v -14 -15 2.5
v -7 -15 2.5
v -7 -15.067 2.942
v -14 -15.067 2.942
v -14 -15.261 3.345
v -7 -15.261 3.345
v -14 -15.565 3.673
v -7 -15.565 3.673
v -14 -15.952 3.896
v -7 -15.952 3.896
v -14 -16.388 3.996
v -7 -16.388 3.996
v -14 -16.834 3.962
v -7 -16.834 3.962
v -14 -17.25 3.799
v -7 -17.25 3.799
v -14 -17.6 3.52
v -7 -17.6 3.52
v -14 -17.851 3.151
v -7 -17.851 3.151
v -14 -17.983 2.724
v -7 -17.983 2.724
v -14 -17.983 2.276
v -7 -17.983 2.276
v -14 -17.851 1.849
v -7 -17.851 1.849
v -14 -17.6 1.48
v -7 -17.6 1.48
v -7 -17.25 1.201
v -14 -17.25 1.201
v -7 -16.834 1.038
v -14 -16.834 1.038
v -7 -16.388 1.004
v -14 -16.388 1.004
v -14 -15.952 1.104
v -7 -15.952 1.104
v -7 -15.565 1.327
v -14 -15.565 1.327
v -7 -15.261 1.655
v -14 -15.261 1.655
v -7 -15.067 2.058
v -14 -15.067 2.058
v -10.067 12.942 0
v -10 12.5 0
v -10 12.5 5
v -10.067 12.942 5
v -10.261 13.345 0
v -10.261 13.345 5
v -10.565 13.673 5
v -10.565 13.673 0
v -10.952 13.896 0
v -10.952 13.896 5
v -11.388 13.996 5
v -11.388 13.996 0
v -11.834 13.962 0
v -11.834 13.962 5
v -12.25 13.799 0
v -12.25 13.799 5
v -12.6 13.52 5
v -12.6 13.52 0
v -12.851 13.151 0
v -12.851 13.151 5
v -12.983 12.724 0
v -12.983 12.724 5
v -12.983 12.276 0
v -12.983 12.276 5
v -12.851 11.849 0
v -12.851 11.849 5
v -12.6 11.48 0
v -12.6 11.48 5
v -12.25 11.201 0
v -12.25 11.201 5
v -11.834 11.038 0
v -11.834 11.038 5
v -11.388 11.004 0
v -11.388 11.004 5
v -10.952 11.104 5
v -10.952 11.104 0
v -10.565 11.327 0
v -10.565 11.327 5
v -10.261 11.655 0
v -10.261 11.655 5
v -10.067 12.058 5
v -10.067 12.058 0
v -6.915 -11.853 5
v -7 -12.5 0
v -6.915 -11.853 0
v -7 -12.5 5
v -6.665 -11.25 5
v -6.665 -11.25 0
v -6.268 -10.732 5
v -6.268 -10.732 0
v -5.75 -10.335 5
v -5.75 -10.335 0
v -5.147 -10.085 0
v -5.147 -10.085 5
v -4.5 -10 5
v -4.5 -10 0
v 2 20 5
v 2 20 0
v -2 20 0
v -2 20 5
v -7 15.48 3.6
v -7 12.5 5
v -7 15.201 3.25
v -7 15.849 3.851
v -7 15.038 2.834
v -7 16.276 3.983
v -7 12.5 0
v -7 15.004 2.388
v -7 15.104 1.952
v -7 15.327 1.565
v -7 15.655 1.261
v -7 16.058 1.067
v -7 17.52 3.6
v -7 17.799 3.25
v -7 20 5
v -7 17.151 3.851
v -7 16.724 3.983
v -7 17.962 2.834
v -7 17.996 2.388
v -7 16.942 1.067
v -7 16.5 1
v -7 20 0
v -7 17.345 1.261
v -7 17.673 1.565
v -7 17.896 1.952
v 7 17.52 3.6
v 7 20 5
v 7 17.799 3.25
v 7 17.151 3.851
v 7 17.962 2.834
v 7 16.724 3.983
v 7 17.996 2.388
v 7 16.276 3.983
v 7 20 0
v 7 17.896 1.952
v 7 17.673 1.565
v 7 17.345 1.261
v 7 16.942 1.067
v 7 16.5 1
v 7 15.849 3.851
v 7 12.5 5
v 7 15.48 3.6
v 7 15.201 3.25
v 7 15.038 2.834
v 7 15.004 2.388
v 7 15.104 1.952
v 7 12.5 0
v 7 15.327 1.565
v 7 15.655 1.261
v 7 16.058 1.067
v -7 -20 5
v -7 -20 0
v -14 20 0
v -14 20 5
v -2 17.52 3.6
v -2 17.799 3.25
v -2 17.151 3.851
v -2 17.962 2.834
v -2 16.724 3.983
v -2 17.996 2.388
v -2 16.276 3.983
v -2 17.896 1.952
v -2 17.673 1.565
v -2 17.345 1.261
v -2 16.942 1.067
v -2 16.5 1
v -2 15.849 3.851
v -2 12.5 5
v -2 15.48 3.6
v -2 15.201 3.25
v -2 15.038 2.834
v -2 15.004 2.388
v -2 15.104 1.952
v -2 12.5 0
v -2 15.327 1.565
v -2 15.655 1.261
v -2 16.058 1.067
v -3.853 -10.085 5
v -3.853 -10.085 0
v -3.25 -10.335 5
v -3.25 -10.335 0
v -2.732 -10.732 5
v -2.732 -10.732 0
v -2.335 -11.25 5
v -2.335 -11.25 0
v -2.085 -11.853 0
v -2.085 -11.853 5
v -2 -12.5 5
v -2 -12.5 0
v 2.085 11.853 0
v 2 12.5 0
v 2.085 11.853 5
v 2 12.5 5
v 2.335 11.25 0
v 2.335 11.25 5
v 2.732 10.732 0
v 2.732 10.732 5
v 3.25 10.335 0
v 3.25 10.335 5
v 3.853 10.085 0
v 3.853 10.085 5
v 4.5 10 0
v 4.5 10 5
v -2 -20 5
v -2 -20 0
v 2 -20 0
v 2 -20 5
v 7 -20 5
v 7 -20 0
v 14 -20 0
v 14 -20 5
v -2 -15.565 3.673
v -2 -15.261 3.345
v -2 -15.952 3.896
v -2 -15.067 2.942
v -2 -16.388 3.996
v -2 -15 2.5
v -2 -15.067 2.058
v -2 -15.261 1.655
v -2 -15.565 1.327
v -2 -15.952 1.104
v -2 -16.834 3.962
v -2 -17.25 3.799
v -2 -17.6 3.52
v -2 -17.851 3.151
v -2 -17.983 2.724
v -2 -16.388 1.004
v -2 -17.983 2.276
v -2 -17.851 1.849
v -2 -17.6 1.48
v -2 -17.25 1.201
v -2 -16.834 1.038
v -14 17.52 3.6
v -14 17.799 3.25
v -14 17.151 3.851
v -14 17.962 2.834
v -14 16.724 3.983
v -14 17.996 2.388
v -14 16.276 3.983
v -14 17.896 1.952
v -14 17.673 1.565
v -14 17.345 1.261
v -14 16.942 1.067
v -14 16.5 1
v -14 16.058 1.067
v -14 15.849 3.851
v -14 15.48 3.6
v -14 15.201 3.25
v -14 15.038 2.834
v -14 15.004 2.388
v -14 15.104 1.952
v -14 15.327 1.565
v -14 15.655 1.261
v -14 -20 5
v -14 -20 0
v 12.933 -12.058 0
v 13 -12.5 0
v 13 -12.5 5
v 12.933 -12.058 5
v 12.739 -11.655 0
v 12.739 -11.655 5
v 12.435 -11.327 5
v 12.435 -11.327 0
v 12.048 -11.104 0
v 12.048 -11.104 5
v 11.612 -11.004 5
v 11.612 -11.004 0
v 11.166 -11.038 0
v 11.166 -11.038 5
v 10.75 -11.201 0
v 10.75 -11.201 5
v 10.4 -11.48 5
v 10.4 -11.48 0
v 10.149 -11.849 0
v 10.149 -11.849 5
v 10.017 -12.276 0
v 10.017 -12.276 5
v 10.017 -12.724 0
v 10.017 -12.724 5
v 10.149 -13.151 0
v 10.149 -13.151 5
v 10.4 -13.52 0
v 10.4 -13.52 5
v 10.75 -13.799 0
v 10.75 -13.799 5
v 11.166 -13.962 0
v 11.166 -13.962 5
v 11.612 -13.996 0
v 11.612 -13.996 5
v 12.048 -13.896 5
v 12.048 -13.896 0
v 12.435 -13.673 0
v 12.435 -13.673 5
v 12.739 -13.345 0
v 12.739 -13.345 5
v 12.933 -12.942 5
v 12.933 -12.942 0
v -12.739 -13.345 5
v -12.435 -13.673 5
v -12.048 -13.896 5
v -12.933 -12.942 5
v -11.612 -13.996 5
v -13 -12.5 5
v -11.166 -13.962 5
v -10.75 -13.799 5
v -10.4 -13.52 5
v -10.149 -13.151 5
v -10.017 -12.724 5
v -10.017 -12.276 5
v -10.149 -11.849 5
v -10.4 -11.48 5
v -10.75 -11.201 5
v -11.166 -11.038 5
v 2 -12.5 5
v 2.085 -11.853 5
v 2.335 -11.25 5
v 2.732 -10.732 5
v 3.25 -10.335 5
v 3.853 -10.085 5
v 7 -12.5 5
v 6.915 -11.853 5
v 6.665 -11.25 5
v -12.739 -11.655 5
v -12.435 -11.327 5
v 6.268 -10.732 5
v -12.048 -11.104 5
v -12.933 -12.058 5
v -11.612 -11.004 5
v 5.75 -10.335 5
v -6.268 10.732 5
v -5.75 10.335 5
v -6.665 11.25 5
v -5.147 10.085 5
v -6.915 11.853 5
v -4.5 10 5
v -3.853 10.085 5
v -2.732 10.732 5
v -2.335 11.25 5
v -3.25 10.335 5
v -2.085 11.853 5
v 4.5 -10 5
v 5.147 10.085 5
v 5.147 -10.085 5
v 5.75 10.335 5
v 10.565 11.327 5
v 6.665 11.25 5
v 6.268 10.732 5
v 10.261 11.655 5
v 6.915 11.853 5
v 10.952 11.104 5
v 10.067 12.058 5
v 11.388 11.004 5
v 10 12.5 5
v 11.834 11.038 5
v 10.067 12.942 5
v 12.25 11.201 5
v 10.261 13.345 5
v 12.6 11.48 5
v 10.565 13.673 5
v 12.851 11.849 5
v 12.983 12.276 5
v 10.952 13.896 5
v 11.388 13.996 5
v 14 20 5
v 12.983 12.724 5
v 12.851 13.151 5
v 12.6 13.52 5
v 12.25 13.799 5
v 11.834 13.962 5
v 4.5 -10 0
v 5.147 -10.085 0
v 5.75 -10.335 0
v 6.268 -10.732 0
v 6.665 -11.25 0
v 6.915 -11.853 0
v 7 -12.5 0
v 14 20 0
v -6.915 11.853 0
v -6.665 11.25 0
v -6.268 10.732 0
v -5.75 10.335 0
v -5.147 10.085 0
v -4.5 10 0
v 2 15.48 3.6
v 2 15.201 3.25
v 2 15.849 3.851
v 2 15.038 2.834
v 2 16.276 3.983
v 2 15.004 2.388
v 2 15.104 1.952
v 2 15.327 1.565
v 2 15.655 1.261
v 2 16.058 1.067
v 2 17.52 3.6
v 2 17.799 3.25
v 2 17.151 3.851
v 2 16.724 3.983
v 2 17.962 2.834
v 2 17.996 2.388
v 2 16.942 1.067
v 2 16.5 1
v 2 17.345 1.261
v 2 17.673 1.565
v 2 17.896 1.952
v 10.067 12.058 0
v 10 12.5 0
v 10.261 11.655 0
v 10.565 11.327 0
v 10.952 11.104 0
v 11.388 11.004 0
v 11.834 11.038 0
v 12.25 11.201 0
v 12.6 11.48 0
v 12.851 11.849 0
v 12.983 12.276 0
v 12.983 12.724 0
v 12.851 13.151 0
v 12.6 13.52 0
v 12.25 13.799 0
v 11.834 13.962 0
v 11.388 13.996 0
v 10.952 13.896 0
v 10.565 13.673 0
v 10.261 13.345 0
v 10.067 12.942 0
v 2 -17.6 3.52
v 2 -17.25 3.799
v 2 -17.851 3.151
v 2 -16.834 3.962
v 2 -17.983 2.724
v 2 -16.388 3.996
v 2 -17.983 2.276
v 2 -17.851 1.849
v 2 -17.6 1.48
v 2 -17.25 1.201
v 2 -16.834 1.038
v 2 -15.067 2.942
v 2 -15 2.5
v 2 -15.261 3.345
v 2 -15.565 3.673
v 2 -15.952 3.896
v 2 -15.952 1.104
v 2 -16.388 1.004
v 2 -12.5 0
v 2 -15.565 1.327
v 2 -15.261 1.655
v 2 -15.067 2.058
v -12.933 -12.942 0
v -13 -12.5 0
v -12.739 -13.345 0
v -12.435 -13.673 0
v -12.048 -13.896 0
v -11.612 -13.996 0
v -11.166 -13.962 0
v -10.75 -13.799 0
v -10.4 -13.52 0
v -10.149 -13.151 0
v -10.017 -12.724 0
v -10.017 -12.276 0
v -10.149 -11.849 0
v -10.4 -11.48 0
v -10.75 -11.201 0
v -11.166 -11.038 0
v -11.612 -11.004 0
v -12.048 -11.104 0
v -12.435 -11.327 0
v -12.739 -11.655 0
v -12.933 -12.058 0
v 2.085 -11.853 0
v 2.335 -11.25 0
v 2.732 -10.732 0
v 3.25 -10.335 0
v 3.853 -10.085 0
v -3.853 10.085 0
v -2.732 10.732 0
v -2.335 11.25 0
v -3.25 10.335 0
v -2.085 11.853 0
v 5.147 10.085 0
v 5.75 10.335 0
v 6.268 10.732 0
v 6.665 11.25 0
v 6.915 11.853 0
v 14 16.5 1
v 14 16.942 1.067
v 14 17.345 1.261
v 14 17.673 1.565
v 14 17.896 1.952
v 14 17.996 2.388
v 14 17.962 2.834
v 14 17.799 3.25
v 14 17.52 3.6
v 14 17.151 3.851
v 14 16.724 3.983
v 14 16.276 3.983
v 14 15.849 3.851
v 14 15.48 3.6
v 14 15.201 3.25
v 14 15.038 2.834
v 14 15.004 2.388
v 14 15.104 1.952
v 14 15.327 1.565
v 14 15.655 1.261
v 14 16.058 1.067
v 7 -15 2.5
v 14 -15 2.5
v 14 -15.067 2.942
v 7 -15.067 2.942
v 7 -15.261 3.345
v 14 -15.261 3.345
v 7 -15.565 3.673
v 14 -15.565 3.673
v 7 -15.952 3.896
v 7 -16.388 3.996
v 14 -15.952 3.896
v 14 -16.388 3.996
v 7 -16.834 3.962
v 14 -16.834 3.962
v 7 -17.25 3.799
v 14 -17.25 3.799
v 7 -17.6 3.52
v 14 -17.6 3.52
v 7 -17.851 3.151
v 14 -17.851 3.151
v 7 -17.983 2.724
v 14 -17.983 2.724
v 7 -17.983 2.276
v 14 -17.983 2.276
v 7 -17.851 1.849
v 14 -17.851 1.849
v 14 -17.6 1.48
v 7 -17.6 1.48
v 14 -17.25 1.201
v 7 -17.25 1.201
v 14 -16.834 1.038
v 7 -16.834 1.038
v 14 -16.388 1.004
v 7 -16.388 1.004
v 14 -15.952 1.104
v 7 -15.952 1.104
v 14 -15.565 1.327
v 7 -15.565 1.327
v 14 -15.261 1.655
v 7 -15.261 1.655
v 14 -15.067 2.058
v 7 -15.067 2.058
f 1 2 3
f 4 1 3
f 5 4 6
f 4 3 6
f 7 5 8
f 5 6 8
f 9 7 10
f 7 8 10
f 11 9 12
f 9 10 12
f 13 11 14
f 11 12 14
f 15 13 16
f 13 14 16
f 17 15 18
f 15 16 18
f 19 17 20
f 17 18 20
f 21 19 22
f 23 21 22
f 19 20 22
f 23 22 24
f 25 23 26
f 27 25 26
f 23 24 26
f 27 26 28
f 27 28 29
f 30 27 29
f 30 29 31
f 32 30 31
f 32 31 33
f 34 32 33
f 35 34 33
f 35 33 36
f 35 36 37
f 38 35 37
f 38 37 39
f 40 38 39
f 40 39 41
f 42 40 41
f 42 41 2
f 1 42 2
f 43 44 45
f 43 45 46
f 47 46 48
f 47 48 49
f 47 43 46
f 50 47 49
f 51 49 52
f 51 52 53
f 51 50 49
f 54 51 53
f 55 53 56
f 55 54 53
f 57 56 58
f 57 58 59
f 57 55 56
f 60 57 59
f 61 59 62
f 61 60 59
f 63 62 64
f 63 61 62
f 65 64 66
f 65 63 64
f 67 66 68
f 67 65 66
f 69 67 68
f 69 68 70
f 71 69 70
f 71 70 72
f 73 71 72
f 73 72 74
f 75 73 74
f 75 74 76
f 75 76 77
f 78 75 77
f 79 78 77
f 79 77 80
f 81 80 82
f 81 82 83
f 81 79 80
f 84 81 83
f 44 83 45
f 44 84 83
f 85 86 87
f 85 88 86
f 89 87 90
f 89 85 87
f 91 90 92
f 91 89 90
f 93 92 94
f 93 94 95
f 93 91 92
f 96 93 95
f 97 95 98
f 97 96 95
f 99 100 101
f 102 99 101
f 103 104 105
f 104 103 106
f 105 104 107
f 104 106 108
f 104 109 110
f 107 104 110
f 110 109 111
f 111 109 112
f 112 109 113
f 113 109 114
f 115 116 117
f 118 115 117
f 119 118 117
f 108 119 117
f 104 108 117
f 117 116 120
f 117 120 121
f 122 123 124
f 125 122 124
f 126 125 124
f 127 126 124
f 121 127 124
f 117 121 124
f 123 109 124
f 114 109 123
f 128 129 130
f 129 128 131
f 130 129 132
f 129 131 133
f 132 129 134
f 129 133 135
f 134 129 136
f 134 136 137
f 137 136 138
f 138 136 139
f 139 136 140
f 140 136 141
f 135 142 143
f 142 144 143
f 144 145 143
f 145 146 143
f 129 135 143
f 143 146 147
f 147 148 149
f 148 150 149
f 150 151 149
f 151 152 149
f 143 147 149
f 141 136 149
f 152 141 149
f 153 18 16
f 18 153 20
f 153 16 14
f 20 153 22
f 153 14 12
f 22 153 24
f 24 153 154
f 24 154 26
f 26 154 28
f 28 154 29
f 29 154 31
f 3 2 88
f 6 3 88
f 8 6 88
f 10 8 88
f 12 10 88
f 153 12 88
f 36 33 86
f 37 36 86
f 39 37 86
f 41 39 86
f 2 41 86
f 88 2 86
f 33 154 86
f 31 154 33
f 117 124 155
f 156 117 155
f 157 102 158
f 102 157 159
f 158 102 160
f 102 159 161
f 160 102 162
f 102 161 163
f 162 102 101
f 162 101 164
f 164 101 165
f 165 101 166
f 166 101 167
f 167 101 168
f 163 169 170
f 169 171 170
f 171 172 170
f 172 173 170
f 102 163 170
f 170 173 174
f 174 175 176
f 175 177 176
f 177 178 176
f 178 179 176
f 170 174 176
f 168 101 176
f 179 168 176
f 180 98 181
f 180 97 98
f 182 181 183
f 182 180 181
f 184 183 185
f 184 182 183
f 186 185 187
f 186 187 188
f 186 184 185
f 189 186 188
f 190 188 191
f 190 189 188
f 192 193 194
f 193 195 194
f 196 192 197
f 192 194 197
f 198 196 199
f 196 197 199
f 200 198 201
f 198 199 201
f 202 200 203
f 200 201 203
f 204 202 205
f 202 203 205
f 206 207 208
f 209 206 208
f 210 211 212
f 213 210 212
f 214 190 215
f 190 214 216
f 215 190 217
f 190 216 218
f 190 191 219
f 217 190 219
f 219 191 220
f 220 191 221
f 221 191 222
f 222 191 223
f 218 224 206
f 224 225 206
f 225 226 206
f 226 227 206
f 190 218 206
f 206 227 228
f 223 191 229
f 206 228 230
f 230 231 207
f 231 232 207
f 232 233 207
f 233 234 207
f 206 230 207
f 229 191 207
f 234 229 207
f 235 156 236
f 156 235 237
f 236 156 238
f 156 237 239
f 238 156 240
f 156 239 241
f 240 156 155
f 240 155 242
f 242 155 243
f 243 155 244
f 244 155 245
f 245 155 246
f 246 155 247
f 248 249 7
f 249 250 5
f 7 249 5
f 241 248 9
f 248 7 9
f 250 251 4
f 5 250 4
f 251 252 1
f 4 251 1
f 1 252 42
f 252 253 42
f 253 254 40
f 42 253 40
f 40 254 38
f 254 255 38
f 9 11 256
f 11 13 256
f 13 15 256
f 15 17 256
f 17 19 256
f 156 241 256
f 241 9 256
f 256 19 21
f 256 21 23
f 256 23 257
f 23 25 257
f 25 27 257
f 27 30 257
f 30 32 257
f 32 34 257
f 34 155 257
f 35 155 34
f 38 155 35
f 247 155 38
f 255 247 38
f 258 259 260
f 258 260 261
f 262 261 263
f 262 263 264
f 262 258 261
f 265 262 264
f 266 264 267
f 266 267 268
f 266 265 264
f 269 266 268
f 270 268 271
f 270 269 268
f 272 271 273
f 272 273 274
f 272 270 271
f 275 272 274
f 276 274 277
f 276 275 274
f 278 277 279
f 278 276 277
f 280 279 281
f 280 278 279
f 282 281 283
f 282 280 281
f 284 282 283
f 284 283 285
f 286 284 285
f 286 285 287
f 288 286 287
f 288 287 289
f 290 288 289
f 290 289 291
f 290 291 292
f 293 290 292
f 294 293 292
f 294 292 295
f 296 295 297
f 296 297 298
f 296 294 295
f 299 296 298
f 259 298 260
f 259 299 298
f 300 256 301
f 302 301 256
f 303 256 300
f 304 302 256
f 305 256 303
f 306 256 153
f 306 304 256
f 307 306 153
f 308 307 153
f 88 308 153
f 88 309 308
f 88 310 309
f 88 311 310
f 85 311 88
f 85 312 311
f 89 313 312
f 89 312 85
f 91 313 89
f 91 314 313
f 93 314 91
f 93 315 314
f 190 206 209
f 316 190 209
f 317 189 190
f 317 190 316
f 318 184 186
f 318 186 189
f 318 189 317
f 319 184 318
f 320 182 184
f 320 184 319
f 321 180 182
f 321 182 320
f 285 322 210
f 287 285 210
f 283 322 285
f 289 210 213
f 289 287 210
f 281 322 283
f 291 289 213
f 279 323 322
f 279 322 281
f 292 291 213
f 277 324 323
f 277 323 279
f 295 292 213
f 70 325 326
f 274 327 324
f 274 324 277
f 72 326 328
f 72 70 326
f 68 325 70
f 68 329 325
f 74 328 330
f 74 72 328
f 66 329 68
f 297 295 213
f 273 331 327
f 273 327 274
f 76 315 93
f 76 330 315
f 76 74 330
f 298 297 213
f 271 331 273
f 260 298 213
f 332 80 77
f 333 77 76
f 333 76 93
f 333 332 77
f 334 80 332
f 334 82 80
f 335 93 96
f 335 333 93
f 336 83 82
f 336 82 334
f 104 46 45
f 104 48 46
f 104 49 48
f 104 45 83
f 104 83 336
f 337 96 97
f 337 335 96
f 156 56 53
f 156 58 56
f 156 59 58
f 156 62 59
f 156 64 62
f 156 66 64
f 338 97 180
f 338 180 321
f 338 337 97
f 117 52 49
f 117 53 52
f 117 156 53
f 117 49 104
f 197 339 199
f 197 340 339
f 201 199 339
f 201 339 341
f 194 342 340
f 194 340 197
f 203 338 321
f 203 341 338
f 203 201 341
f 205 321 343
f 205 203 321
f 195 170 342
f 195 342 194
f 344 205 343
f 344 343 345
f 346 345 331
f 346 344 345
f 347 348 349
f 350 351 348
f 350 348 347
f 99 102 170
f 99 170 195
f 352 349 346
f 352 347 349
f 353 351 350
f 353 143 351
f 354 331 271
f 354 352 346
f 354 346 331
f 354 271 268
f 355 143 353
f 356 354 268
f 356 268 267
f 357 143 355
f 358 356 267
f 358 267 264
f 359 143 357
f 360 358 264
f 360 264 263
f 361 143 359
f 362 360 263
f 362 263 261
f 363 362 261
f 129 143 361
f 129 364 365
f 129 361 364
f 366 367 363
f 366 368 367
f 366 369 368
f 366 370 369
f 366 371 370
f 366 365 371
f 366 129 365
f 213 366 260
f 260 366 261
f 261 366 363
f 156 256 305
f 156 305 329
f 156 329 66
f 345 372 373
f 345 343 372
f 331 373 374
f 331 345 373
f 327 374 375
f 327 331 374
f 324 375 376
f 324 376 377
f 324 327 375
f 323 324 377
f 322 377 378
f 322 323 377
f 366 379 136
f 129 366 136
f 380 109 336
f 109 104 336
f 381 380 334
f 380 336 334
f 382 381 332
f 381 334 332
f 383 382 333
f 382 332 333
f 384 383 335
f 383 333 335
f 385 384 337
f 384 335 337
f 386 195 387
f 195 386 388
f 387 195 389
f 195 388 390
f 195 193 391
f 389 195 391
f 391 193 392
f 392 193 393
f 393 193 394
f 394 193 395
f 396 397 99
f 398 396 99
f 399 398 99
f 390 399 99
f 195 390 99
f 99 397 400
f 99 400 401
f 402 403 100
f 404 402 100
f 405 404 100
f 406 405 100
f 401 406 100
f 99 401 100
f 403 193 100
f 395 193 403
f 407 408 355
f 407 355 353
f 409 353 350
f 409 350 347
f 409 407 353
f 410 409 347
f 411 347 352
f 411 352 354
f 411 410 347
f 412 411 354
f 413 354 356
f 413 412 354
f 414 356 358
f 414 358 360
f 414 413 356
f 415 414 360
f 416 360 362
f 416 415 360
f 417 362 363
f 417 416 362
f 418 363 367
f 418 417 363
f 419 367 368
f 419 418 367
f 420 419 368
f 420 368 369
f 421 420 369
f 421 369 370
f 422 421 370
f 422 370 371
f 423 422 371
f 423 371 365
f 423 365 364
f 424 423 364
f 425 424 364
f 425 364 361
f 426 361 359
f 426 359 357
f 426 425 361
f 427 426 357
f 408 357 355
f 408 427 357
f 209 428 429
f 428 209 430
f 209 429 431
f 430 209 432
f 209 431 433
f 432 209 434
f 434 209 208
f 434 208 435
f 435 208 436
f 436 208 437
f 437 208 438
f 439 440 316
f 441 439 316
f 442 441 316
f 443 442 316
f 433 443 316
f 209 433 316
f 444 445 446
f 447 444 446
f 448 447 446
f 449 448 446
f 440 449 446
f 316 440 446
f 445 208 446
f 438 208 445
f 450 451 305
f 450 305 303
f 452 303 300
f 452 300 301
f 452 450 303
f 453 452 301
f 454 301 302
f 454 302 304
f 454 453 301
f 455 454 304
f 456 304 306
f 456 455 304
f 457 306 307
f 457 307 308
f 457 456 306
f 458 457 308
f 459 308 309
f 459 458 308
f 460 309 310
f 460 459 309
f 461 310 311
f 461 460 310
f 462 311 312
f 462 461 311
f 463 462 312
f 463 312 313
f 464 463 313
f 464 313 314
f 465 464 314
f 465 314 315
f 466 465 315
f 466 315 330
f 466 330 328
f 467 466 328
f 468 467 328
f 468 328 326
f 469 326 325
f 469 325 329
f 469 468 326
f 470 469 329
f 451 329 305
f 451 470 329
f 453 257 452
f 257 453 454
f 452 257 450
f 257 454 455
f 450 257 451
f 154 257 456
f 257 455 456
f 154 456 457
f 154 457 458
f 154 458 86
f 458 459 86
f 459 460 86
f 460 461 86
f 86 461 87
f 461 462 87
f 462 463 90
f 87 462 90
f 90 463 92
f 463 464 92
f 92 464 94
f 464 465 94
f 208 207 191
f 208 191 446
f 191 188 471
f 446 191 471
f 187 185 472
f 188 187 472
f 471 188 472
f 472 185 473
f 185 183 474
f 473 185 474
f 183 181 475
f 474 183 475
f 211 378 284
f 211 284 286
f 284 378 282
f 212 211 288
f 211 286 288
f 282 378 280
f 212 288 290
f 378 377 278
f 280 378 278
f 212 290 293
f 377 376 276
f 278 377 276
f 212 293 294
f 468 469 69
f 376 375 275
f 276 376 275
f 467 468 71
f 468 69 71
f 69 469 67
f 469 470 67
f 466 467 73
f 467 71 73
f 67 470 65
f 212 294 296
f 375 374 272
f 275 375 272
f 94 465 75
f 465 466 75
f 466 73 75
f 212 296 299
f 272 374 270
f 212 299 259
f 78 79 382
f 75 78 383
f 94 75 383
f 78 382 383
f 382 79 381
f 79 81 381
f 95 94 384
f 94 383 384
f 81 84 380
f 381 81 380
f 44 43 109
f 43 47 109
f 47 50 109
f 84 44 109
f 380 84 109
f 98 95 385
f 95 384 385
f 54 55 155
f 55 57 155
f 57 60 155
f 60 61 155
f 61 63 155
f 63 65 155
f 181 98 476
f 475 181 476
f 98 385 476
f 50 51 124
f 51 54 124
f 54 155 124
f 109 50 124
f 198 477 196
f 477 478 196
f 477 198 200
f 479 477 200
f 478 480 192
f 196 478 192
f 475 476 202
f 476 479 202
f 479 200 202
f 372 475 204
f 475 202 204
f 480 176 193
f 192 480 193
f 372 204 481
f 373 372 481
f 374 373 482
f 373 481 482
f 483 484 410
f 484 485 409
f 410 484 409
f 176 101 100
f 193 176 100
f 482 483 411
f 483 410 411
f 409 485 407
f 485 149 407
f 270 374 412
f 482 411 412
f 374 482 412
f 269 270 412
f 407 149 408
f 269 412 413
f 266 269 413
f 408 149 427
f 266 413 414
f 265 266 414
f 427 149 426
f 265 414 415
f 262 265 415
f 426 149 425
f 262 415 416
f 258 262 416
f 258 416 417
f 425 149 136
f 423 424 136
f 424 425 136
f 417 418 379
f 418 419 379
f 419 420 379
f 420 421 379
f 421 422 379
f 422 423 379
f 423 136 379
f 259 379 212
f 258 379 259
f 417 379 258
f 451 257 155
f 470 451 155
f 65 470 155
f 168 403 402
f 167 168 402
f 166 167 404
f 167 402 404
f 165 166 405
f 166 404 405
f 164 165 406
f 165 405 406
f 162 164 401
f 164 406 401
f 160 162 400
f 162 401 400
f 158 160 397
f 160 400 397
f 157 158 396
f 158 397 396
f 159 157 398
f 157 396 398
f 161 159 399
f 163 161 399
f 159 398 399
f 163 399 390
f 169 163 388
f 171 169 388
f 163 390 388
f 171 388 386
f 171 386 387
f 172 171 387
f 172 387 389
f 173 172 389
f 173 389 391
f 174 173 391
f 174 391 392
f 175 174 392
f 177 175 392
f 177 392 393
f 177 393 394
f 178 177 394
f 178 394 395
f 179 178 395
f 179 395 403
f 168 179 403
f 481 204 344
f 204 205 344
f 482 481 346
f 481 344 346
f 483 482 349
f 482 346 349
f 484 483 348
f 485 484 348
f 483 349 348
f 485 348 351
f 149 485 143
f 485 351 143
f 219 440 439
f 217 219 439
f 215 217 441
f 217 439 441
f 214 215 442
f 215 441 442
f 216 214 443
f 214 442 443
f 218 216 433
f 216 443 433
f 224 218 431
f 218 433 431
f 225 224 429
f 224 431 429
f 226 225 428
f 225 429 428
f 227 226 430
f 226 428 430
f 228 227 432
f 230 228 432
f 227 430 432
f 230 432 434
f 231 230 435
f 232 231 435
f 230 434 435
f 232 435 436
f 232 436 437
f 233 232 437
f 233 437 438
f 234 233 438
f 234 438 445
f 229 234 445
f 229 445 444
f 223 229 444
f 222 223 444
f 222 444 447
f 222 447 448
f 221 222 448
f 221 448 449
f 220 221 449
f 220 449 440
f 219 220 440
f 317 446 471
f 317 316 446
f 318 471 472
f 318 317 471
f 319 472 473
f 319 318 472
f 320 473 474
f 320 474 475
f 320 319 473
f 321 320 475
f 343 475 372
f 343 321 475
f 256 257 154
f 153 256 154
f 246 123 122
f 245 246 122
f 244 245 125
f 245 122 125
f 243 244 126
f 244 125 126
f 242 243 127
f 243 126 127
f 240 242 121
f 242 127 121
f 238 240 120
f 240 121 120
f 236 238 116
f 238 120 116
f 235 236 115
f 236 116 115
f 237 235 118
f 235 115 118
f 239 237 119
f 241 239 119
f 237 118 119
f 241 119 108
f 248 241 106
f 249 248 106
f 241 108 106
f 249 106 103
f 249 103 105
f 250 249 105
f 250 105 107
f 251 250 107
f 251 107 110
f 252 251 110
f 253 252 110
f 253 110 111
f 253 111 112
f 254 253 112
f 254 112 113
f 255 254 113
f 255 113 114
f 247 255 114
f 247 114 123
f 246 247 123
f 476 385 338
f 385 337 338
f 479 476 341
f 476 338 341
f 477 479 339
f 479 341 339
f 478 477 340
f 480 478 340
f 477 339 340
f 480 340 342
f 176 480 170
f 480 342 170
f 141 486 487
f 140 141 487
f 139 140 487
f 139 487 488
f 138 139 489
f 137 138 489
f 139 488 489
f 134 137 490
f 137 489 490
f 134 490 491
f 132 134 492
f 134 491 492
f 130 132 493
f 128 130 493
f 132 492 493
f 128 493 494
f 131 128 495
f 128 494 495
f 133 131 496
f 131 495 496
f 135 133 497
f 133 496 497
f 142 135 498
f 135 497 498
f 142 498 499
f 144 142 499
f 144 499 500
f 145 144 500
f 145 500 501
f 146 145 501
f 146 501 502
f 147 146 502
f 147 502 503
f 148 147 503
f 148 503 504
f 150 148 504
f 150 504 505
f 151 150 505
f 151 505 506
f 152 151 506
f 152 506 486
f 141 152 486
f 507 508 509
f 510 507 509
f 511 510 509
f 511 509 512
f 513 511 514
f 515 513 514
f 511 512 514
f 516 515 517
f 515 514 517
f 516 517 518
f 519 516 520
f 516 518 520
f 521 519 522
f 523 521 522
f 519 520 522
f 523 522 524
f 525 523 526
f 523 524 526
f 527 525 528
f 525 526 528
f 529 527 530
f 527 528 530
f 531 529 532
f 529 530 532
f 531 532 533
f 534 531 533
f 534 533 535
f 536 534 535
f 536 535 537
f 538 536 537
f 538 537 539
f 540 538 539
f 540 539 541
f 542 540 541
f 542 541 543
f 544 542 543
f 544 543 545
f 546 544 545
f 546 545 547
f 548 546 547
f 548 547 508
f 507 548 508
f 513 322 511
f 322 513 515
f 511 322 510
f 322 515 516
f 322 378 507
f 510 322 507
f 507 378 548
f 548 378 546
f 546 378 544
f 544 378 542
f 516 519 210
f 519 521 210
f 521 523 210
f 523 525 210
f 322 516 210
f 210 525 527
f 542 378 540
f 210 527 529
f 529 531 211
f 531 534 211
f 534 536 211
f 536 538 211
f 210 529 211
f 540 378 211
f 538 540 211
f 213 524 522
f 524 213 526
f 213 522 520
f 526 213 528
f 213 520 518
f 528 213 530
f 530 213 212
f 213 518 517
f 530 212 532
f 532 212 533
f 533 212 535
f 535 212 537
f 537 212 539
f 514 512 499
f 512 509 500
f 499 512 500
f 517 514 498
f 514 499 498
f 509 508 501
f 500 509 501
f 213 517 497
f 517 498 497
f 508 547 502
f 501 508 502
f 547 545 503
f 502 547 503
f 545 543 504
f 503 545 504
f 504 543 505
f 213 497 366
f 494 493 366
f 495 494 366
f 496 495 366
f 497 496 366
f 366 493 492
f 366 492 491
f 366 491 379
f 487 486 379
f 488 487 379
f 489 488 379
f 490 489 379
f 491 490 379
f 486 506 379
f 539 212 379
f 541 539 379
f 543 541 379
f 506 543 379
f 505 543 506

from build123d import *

# Parameters (mm, degrees)
SKETCH_1_R          = 1.5
EXTRUDE_1_DEPTH     = 5
FILLET_1_R          = 2.5
SKETCH_3_R          = 1.5
CUT_EXTRUDE_1_DEPTH = 49


with BuildPart() as part:
    # 草图1 → 凸台-拉伸1 (new body)
    with BuildSketch(Plane.XY):
        Polygon((-14, -20), (-7, -20), (-7, -10), (-2, -10), (-2, -20), (2, -20), (2, -10), (7, -10), (7, -20), (14, -20), (14, 20), (7, 20), (7, 10), (2, 10), (2, 20), (-2, 20), (-2, 10), (-7, 10), (-7, 20), (-14, 20), align=None)
        with Locations((-11.5, 12.5)):
            Circle(SKETCH_1_R, mode=Mode.SUBTRACT)
        with Locations(Location((11.5, 12.5, 0), (0, 0, 180))):
            Circle(SKETCH_1_R, mode=Mode.SUBTRACT)
        with Locations((11.5, -12.5)):
            Circle(SKETCH_1_R, mode=Mode.SUBTRACT)
        with Locations(Location((-11.5, -12.5, 0), (0, 0, 180))):
            Circle(SKETCH_1_R, mode=Mode.SUBTRACT)
    extrude(amount=EXTRUDE_1_DEPTH)

    # 圆角1
    fillet_1_edges = [part.edges().sort_by_distance(p)[0] for p in [
        (7, -10, 2.5),
        (2, -10, 2.5),
        (-2, -10, 2.5),
        (-7, -10, 2.5),
        (7, 10, 2.5),
        (2, 10, 2.5),
        (-2, 10, 2.5),
        (-7, 10, 2.5),
    ]]
    fillet(fillet_1_edges, radius=FILLET_1_R - 0.0001)  # a hair under: the kernel refuses the full size

    # 草图3 → 切除-拉伸1 (cut)
    with BuildSketch(Plane(origin=(14, 0, 0), x_dir=(0, 0, -1), z_dir=(1, 0, 0))):
        with Locations((-2.5, 16.5)):
            Circle(SKETCH_3_R)
        with Locations(Location((-2.5, -16.5, 0), (0, 0, 90))):
            Circle(SKETCH_3_R)
    extrude(amount=-CUT_EXTRUDE_1_DEPTH, mode=Mode.SUBTRACT)


solid = part.part
